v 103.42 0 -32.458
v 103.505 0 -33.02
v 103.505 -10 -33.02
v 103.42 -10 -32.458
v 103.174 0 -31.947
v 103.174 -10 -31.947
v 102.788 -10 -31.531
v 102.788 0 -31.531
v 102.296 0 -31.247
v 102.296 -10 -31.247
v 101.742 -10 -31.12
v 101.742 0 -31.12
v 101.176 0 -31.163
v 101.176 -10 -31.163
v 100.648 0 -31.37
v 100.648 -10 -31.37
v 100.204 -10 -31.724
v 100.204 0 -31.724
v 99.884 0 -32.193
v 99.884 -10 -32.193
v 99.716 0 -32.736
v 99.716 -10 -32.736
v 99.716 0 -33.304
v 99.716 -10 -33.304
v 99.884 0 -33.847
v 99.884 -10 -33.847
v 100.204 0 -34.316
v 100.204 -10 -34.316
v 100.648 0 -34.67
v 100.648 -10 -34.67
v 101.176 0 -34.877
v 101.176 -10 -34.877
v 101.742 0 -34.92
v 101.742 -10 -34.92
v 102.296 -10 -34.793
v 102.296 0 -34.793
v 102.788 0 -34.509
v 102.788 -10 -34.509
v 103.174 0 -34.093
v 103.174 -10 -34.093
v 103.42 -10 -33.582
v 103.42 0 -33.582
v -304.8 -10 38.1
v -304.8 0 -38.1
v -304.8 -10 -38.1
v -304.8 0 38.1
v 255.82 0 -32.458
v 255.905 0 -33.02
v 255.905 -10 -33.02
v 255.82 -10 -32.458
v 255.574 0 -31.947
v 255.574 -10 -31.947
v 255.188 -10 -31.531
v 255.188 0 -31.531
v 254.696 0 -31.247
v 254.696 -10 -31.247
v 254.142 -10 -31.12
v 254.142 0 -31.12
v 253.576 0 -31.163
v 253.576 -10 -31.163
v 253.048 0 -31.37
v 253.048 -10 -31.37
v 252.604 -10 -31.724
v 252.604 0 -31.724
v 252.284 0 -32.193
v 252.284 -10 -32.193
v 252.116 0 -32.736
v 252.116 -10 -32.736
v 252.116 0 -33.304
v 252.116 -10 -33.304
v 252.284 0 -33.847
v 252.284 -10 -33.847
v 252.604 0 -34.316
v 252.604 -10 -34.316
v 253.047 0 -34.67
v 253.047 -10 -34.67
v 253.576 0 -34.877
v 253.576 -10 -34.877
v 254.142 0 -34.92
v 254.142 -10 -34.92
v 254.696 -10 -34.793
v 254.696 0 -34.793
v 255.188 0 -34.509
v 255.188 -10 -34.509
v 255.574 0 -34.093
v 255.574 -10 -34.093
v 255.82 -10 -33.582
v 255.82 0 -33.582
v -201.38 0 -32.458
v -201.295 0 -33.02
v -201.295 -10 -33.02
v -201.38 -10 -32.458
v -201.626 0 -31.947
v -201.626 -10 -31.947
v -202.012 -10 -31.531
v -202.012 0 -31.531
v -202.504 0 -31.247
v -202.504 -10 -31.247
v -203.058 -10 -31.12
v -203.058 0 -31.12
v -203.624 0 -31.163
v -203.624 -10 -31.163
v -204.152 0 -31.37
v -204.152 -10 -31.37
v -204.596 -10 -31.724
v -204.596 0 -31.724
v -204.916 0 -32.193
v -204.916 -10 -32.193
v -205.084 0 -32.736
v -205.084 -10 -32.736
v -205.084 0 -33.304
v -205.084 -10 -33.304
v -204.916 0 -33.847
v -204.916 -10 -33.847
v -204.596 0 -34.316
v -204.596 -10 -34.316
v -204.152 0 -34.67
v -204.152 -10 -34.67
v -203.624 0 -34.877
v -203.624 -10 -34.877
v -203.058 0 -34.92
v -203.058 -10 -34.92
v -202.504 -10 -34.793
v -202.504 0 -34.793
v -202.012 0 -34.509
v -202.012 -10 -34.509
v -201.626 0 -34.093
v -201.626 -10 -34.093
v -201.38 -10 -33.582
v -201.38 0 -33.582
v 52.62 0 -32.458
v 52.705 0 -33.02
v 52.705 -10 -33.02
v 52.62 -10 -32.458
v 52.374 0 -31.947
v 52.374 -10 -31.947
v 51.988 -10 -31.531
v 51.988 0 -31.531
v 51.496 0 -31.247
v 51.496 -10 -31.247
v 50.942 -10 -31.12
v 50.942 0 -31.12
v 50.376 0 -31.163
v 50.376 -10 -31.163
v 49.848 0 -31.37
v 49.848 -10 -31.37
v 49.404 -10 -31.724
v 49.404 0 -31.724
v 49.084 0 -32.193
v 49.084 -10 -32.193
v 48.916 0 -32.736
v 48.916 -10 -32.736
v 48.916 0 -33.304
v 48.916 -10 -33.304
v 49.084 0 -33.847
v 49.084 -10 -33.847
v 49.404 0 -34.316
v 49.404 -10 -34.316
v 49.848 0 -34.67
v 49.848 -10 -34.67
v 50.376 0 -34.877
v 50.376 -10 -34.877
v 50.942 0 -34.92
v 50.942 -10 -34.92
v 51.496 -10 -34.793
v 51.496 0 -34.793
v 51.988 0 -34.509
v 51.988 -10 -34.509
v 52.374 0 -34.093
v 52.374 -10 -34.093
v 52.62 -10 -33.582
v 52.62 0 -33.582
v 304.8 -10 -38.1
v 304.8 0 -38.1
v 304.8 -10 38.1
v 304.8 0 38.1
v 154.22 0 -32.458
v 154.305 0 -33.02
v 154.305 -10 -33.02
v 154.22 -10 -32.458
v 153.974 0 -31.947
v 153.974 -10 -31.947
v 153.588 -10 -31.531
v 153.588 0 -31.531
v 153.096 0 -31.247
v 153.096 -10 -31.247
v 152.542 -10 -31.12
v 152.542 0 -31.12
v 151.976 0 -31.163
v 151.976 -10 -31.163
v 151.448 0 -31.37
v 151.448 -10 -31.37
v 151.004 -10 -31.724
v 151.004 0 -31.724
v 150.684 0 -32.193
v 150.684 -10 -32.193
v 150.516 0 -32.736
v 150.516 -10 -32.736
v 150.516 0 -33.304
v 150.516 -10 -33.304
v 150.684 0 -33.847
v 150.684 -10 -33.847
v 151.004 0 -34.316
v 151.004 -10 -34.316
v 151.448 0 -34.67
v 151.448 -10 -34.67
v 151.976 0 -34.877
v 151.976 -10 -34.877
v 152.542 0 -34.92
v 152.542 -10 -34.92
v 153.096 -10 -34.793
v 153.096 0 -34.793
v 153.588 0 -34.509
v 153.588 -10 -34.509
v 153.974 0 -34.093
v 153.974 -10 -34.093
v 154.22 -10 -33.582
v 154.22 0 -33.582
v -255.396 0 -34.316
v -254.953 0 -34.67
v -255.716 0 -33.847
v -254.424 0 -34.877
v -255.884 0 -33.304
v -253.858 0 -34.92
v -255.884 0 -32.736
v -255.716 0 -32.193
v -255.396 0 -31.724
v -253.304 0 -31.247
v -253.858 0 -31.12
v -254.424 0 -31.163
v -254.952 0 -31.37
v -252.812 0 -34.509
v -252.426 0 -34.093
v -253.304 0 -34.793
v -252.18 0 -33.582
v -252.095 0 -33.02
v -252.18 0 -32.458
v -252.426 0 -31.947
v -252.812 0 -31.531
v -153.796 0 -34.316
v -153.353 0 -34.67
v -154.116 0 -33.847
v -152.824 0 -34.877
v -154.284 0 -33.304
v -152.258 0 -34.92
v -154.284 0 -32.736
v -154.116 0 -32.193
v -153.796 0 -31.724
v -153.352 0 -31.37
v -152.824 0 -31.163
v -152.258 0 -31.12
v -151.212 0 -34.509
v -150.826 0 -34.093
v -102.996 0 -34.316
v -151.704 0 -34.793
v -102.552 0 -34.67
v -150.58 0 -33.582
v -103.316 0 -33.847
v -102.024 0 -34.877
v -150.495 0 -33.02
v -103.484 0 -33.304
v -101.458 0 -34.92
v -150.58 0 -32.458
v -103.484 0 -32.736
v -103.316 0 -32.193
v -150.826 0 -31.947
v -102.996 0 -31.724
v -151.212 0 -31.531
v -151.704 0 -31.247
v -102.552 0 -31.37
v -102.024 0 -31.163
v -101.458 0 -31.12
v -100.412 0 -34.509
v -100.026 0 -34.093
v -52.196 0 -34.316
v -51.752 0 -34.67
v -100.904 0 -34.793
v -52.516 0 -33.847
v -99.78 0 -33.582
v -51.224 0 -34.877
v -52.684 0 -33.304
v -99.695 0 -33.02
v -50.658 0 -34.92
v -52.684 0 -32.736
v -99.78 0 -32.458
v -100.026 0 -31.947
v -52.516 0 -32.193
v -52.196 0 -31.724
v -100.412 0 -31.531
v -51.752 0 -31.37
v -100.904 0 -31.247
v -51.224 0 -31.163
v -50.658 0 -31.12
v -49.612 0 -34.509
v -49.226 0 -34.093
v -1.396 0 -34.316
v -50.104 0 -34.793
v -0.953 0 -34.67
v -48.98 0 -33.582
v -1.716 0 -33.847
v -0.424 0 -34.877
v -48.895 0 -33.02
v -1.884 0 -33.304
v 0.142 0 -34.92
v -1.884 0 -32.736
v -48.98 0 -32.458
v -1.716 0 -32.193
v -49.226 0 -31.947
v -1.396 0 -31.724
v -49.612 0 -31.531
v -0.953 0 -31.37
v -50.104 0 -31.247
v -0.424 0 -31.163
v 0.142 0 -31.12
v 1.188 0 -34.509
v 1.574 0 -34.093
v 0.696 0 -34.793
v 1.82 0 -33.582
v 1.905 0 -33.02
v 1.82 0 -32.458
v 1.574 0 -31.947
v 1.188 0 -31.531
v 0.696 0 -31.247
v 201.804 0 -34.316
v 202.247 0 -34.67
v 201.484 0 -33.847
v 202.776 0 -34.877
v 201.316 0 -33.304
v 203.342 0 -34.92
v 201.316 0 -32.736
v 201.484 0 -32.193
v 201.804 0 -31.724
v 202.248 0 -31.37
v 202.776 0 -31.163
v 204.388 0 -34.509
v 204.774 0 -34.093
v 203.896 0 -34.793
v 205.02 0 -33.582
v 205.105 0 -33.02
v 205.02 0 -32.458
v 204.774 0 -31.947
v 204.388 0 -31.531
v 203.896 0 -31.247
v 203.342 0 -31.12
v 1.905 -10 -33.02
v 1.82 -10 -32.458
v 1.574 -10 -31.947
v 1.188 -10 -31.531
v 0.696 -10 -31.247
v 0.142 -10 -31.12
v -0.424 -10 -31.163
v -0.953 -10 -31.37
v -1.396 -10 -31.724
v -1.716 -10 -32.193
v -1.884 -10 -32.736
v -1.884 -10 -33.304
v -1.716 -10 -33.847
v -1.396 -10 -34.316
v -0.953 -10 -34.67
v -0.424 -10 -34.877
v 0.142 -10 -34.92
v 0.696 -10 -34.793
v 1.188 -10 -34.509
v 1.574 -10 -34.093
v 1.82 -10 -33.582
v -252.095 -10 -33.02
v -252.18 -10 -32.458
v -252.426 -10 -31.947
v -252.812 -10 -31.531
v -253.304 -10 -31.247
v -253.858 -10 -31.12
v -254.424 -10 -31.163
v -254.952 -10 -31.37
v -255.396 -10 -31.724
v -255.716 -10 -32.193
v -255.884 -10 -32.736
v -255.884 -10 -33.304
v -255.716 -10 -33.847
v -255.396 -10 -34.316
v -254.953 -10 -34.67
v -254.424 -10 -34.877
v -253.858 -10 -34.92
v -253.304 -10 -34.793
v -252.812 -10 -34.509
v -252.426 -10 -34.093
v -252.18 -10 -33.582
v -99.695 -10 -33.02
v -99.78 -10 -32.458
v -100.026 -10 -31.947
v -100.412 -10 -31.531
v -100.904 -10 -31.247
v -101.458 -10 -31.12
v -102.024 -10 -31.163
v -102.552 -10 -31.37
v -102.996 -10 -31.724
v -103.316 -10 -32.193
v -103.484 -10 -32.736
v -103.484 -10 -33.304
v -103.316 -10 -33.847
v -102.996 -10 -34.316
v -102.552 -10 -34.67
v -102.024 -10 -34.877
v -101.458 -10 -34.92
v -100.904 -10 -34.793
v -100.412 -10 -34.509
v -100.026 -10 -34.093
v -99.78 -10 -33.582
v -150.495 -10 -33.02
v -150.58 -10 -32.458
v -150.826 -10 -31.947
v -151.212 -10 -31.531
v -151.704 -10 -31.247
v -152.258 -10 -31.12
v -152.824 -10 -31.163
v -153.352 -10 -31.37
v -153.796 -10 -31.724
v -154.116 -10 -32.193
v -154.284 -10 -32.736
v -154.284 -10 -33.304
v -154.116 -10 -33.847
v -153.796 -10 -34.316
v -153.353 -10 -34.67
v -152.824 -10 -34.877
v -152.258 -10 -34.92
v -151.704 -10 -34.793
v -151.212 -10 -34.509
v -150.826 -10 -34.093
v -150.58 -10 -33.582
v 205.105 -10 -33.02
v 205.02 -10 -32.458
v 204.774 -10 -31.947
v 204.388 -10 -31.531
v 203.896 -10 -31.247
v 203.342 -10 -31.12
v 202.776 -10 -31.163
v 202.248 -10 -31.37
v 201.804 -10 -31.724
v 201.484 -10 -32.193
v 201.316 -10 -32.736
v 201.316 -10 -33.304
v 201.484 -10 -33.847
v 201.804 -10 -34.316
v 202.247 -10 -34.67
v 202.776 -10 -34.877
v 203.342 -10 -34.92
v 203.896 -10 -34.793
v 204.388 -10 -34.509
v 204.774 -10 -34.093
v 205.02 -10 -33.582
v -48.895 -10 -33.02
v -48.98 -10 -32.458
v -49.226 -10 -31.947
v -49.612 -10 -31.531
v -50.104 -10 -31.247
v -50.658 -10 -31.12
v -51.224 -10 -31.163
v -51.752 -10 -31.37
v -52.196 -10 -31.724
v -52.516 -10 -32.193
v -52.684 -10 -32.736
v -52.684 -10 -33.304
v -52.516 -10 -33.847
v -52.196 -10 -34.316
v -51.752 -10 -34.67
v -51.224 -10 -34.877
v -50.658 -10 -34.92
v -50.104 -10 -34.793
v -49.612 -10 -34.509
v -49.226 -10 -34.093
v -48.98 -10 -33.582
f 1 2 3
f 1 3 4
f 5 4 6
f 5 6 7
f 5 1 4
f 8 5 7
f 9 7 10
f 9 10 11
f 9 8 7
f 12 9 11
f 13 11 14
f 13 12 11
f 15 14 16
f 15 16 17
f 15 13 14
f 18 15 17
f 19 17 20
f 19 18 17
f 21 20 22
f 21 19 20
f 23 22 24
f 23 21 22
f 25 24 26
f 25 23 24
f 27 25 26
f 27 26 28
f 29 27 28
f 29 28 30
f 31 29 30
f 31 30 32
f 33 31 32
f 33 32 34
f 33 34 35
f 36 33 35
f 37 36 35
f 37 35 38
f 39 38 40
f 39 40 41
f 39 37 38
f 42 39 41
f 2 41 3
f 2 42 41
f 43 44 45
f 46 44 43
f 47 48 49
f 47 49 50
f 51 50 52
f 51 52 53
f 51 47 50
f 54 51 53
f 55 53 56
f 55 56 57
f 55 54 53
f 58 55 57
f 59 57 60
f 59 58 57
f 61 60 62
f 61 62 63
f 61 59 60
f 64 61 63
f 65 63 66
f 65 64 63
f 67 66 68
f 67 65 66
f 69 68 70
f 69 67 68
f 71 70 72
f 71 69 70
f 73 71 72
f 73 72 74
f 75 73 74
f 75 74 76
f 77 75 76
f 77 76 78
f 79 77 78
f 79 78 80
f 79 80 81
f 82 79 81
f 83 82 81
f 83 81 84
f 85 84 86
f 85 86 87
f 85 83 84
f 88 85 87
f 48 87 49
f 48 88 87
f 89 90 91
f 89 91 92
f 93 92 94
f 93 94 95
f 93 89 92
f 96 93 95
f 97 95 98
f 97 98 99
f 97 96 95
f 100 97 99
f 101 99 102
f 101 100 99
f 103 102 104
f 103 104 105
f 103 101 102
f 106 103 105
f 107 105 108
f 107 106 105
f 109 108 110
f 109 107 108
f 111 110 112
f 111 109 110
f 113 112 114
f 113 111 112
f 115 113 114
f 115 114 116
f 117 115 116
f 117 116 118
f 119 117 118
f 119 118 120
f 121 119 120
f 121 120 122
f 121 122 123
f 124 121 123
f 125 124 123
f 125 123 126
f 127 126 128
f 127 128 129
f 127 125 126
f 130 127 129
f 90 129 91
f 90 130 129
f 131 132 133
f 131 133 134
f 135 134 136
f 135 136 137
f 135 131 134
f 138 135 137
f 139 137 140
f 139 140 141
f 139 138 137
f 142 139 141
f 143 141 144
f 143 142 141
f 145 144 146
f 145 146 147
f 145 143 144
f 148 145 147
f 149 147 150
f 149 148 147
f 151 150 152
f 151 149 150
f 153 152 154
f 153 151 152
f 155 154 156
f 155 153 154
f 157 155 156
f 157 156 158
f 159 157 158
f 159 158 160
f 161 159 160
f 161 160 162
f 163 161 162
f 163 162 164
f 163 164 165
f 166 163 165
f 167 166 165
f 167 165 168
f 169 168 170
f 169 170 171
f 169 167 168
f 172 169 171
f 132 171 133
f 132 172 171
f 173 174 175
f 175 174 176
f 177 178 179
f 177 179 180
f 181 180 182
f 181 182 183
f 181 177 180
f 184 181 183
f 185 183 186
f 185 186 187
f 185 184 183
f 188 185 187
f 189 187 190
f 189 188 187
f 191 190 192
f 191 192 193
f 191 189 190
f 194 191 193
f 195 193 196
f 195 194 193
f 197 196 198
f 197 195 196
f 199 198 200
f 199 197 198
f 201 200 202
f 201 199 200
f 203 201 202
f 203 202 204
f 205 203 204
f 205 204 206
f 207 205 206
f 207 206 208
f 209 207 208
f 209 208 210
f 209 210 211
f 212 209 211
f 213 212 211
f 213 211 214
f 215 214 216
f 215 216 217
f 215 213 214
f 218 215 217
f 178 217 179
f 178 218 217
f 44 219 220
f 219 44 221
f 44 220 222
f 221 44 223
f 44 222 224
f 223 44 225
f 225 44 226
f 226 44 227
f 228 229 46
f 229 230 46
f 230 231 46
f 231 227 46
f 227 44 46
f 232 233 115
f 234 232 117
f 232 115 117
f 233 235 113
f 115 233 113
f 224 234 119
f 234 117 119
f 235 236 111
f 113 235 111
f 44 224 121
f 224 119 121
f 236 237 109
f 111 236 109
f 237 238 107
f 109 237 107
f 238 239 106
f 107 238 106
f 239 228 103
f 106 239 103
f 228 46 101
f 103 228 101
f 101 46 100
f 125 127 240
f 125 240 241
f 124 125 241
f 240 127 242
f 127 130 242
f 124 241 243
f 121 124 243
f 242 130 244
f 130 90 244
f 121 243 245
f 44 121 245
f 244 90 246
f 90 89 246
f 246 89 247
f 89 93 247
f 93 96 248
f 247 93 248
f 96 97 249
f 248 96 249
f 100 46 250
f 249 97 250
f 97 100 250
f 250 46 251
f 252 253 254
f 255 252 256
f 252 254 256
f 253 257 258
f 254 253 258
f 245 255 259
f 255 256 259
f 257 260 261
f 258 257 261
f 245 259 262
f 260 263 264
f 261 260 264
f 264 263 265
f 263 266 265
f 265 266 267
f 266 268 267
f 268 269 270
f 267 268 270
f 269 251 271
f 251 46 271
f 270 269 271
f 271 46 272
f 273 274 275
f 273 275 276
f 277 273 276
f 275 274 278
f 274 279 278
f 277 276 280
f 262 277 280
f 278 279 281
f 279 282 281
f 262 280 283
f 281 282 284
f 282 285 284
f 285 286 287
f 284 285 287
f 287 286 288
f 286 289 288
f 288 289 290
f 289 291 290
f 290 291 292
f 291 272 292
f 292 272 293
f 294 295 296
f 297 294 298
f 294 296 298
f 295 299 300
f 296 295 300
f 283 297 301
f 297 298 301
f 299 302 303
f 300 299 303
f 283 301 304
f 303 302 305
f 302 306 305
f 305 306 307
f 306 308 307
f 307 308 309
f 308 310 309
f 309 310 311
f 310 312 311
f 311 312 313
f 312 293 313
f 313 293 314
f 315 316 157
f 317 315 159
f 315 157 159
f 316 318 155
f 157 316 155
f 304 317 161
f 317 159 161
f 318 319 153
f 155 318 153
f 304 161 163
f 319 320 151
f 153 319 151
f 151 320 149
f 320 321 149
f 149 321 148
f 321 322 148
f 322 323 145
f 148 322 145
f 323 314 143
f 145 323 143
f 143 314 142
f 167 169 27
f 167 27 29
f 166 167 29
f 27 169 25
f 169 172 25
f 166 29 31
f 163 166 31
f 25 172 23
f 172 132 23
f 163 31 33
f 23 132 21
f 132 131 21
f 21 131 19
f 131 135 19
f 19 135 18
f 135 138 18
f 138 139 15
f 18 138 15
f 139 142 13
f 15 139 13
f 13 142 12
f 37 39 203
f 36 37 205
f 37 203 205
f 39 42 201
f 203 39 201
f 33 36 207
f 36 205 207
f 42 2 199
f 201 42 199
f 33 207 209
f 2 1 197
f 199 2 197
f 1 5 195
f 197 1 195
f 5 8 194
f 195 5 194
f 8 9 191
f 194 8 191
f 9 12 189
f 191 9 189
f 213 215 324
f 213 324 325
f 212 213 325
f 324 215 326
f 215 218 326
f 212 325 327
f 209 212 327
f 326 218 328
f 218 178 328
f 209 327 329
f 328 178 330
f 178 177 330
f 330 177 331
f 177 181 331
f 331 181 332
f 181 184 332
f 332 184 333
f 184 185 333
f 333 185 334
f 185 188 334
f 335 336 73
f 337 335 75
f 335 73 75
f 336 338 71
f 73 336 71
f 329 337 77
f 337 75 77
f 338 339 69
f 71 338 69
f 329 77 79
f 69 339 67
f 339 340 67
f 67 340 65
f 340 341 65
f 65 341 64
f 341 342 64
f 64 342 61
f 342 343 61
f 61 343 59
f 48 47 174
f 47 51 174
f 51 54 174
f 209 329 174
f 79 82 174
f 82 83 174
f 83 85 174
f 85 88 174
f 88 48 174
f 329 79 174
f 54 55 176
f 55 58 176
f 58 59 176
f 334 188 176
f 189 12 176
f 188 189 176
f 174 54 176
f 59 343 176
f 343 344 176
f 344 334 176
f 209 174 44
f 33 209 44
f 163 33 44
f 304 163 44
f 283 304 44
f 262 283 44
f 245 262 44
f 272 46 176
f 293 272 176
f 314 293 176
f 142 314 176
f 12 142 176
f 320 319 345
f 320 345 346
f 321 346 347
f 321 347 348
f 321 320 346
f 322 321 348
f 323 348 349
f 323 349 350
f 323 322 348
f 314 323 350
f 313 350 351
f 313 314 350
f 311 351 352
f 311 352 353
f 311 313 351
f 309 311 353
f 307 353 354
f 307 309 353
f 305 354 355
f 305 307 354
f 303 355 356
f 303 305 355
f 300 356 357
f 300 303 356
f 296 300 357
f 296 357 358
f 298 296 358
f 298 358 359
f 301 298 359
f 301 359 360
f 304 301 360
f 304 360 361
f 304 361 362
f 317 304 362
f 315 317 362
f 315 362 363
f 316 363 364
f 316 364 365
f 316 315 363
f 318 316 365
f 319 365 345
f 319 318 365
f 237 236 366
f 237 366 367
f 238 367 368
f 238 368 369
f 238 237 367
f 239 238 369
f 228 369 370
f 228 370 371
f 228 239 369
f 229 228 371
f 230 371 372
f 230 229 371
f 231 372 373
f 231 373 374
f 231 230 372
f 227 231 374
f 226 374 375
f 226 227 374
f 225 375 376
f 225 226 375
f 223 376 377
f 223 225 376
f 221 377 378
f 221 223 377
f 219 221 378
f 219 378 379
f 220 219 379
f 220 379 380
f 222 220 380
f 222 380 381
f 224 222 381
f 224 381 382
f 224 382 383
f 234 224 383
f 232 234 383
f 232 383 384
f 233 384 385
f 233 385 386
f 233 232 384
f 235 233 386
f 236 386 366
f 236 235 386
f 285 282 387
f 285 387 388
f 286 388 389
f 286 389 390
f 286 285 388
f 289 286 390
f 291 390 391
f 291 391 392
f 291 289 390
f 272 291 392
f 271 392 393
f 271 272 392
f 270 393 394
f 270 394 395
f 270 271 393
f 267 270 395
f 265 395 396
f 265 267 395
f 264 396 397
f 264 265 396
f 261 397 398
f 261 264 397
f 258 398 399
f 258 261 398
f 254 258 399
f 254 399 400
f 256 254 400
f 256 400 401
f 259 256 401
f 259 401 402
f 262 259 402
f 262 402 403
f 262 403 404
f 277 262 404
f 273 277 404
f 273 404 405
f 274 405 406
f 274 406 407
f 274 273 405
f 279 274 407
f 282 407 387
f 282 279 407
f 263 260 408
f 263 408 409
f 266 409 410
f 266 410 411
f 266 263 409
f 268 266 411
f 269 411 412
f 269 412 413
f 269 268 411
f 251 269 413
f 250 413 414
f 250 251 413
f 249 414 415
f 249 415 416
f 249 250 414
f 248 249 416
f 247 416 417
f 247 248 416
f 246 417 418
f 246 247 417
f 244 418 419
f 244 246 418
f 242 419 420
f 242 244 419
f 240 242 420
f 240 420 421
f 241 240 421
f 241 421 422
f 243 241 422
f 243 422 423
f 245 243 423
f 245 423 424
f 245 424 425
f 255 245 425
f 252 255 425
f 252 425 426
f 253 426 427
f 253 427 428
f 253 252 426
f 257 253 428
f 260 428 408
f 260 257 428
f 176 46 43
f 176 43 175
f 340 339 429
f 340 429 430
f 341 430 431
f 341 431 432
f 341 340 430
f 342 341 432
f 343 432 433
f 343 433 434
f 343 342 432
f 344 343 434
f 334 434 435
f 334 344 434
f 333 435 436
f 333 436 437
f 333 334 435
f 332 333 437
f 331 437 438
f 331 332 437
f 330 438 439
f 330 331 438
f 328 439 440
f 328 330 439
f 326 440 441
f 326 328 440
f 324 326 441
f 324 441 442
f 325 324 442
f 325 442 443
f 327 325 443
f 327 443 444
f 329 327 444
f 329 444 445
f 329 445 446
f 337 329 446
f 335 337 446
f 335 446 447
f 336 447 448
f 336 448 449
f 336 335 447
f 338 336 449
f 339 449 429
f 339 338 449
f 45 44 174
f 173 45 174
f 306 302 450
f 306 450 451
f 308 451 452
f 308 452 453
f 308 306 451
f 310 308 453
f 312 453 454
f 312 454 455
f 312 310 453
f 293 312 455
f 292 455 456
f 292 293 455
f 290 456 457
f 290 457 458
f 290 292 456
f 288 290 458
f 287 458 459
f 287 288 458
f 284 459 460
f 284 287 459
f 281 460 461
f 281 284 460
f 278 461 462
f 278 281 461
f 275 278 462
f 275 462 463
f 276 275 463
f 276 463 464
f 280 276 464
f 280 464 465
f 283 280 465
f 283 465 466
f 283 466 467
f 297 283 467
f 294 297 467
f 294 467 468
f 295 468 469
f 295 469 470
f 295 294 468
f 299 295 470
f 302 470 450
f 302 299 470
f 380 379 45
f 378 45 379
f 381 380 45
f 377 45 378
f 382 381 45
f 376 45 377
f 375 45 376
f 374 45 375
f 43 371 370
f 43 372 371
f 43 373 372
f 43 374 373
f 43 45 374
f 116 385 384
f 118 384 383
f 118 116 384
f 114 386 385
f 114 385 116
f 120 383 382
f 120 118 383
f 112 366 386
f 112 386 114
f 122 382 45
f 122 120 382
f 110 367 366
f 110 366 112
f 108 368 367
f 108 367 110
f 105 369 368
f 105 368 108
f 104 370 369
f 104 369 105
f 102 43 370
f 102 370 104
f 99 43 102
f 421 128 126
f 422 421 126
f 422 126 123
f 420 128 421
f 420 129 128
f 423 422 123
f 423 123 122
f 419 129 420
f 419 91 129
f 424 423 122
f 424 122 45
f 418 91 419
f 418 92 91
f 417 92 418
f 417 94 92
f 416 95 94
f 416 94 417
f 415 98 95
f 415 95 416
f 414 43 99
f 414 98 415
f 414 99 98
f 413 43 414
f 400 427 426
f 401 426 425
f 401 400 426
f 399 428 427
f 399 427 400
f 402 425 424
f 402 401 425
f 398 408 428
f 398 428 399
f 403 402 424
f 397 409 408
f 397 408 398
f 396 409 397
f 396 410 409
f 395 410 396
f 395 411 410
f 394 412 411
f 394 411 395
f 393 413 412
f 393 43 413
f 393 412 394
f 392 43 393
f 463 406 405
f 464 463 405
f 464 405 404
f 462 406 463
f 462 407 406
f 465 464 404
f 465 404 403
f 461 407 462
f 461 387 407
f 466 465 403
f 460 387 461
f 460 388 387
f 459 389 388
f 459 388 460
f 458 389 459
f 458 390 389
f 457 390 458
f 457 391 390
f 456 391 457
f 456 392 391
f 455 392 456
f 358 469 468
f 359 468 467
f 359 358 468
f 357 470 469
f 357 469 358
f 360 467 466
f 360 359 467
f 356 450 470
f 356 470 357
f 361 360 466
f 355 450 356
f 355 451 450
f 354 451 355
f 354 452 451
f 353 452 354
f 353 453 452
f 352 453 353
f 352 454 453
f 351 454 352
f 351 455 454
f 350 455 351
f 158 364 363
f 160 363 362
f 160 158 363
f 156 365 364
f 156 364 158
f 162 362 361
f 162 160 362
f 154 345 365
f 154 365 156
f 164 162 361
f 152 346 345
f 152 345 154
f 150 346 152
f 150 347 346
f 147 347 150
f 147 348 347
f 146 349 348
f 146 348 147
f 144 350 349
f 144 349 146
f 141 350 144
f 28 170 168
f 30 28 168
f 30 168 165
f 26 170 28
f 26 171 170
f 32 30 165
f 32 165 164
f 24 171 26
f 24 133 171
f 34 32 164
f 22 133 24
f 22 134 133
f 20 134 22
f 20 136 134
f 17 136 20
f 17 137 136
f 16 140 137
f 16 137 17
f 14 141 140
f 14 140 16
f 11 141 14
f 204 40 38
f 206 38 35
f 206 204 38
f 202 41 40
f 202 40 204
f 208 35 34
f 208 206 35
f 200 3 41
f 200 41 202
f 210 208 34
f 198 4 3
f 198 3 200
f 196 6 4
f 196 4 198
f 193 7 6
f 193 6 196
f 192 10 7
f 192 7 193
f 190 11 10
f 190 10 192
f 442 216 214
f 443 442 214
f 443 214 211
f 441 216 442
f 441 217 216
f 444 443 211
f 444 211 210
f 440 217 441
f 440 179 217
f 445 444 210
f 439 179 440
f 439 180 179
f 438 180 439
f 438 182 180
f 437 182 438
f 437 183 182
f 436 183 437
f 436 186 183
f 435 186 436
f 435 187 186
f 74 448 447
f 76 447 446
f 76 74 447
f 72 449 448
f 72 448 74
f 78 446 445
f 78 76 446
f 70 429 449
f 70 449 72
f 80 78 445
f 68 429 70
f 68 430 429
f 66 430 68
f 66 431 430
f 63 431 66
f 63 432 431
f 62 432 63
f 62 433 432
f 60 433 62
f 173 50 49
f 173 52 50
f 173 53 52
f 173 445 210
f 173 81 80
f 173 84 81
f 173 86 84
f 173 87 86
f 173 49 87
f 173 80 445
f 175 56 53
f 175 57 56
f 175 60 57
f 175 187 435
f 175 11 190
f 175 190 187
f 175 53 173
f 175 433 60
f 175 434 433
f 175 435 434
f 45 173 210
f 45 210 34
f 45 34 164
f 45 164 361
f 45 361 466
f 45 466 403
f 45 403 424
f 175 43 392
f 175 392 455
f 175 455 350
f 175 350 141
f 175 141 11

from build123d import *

# Parameters (mm, degrees)
F0_W     = 609.6
F0_H     = 76.2
F0_R     = 1.905
F1_DEPTH = 10


with BuildPart() as f1:
    # F0 (on Front) → F1 (new body)
    with BuildSketch(Plane.XZ):
        Rectangle(F0_W, F0_H)
        with Locations((-254, -33.02)):
            Circle(F0_R, mode=Mode.SUBTRACT)
        with Locations((-203.2, -33.02)):
            Circle(F0_R, mode=Mode.SUBTRACT)
        with Locations((-152.4, -33.02)):
            Circle(F0_R, mode=Mode.SUBTRACT)
        with Locations((-101.6, -33.02)):
            Circle(F0_R, mode=Mode.SUBTRACT)
        with Locations((-50.8, -33.02)):
            Circle(F0_R, mode=Mode.SUBTRACT)
        with Locations((0, -33.02)):
            Circle(F0_R, mode=Mode.SUBTRACT)
        with Locations((50.8, -33.02)):
            Circle(F0_R, mode=Mode.SUBTRACT)
        with Locations((101.6, -33.02)):
            Circle(F0_R, mode=Mode.SUBTRACT)
        with Locations((152.4, -33.02)):
            Circle(F0_R, mode=Mode.SUBTRACT)
        with Locations((203.2, -33.02)):
            Circle(F0_R, mode=Mode.SUBTRACT)
        with Locations((254, -33.02)):
            Circle(F0_R, mode=Mode.SUBTRACT)
    extrude(amount=F1_DEPTH)


solid = f1.part
